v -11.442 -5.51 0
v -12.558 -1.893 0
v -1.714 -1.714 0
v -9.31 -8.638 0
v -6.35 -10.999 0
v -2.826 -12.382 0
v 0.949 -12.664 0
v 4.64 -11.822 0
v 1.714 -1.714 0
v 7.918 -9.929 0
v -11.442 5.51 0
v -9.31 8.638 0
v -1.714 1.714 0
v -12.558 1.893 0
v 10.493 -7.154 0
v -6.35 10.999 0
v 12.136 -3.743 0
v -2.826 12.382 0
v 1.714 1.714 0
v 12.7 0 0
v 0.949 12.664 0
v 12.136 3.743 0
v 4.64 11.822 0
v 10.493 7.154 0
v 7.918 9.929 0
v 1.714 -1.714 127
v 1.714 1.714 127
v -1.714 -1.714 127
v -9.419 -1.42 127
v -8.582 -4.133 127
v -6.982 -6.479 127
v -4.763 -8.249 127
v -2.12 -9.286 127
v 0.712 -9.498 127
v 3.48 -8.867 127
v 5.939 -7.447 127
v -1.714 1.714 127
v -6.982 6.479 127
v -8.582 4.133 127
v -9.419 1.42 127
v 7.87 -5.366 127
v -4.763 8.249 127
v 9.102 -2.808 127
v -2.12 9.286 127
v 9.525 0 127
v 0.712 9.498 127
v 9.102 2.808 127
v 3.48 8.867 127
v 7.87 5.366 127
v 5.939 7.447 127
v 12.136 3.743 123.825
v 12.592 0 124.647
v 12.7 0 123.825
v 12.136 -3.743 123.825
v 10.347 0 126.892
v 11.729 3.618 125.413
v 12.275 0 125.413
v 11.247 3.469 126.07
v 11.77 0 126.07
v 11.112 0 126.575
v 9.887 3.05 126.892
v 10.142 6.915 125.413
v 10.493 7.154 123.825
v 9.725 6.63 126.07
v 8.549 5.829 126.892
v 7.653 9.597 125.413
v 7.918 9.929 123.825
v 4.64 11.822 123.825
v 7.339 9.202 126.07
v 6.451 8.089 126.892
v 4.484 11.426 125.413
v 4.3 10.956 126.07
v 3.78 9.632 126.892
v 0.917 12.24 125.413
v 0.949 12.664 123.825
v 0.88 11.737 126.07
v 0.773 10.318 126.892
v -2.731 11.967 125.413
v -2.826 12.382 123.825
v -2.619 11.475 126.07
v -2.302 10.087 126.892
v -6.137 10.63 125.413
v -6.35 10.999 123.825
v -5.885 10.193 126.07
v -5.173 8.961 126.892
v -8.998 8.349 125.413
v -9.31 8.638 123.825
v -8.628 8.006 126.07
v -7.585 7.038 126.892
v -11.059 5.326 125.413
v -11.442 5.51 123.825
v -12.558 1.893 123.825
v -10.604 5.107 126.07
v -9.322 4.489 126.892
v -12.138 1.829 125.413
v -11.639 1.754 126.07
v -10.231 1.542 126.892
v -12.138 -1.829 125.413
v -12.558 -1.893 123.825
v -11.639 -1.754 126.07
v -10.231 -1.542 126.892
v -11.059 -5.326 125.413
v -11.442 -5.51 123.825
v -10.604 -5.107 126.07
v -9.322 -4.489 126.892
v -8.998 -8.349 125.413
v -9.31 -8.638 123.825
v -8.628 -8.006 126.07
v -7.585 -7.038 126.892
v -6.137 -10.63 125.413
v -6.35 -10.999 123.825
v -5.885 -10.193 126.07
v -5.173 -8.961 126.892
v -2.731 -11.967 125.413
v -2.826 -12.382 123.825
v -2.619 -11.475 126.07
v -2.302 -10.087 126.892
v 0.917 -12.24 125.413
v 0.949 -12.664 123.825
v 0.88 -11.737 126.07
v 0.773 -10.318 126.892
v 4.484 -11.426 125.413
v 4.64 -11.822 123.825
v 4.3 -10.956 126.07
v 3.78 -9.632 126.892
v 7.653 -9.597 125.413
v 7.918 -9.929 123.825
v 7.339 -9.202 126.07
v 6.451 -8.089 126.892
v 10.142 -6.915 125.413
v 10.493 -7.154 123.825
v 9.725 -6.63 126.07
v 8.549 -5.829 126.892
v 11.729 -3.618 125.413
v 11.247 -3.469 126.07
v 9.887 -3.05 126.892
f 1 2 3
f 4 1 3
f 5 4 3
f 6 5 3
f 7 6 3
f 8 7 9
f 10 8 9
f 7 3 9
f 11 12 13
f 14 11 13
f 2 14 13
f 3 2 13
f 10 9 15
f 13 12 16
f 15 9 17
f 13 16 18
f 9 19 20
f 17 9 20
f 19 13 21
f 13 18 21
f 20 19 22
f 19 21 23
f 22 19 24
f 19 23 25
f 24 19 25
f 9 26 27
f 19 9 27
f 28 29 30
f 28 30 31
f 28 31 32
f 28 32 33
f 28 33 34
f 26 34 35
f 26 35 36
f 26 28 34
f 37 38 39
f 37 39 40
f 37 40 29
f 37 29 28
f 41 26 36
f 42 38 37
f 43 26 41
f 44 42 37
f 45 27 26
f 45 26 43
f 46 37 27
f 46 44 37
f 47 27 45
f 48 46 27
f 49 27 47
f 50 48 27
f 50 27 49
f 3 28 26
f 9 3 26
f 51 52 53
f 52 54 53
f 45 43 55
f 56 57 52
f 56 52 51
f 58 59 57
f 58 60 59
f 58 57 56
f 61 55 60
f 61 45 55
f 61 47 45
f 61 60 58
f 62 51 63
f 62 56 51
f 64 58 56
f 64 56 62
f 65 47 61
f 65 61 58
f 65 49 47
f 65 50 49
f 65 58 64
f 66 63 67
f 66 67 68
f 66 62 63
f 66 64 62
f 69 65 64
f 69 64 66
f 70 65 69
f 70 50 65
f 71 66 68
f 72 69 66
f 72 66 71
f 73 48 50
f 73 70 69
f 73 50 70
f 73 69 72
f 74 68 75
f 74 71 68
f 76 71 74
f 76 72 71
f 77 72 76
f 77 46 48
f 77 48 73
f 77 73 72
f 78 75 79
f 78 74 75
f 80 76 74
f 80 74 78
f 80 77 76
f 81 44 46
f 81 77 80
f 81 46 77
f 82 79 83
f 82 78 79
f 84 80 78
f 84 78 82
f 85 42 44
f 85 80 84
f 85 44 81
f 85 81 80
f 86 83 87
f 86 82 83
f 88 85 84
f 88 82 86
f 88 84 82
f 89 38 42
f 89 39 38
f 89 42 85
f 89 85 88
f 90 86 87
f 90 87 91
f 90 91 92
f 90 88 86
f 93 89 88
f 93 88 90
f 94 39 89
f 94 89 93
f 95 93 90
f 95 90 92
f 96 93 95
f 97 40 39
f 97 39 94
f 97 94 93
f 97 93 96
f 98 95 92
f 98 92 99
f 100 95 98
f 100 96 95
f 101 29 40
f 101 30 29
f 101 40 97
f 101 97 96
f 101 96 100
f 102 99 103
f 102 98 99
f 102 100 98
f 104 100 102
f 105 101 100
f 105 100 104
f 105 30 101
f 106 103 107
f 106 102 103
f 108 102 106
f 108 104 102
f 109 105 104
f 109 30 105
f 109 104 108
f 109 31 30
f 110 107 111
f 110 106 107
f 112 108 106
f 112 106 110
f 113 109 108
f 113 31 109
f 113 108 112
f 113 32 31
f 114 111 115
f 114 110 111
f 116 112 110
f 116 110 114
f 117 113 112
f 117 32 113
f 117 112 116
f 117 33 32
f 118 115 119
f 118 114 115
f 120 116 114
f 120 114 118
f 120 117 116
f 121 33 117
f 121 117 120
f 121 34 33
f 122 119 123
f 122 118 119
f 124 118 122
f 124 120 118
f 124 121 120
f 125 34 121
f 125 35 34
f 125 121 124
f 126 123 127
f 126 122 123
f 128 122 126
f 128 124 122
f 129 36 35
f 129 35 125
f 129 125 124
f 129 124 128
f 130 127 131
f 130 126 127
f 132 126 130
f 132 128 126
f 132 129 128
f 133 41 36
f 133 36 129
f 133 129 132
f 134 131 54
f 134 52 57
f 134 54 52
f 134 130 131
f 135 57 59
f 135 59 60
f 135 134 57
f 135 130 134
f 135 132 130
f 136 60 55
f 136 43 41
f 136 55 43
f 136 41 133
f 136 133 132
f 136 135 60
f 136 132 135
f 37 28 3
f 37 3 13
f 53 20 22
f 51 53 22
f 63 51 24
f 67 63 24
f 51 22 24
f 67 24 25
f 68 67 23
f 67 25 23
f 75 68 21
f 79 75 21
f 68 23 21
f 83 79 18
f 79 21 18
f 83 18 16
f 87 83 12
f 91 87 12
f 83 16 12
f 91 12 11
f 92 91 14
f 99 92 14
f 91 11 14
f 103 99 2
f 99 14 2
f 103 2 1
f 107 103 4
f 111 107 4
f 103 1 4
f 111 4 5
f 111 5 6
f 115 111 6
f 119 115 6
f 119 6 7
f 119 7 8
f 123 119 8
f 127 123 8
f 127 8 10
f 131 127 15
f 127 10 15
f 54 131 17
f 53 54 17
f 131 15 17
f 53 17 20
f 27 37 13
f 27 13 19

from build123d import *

# Parameters (mm, degrees)
F0_R     = 12.7
F1_DEPTH = 127
F2_R     = 3.175
F3_W     = 3.429
F3_H     = 3.429
F4_DEPTH = 127.001


with BuildPart() as f1:
    # F0 (on Top) → F1 (new body)
    with BuildSketch(Plane.XY):
        Circle(F0_R)
    extrude(amount=F1_DEPTH)

    # F2
    f2_edges = [f1.edges().sort_by_distance(p)[0] for p in [
        (-12.7, 0, 127),
    ]]
    fillet(f2_edges, radius=F2_R)

    # F3 (on face) → F4 (cut, through all)
    with BuildSketch(Plane.XY.offset(127)):
        Rectangle(F3_W, F3_H)
    extrude(amount=-F4_DEPTH, mode=Mode.SUBTRACT)


solid = f1.part
